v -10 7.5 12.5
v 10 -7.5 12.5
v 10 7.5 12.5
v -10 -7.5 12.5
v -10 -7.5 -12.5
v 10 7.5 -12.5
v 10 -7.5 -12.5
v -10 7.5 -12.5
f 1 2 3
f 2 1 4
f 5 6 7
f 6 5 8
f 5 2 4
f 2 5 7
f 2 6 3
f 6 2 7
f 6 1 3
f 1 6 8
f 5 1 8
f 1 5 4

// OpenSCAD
// Test OpenSCAD with customizer parameters
// Size parameters
length = 20;    // [10:50]
width = 15;     // [10:50]
height = 25;    // [10:50]

// Shape selection
shape = "cube"; // [cube, sphere, cylinder]

// Colors
color_r = 0.8;  // [0:0.1:1]
color_g = 0.2;  // [0:0.1:1]
color_b = 0.5;  // [0:0.1:1]

// Main geometry
if (shape == "cube") {
    color([color_r, color_g, color_b]) 
    cube([length, width, height], center=true);
} else if (shape == "sphere") {
    color([color_r, color_g, color_b]) 
    sphere(r=max(length, width, height)/2);
} else if (shape == "cylinder") {
    color([color_r, color_g, color_b]) 
    cylinder(h=height, r=min(length, width)/2, center=true);
}
